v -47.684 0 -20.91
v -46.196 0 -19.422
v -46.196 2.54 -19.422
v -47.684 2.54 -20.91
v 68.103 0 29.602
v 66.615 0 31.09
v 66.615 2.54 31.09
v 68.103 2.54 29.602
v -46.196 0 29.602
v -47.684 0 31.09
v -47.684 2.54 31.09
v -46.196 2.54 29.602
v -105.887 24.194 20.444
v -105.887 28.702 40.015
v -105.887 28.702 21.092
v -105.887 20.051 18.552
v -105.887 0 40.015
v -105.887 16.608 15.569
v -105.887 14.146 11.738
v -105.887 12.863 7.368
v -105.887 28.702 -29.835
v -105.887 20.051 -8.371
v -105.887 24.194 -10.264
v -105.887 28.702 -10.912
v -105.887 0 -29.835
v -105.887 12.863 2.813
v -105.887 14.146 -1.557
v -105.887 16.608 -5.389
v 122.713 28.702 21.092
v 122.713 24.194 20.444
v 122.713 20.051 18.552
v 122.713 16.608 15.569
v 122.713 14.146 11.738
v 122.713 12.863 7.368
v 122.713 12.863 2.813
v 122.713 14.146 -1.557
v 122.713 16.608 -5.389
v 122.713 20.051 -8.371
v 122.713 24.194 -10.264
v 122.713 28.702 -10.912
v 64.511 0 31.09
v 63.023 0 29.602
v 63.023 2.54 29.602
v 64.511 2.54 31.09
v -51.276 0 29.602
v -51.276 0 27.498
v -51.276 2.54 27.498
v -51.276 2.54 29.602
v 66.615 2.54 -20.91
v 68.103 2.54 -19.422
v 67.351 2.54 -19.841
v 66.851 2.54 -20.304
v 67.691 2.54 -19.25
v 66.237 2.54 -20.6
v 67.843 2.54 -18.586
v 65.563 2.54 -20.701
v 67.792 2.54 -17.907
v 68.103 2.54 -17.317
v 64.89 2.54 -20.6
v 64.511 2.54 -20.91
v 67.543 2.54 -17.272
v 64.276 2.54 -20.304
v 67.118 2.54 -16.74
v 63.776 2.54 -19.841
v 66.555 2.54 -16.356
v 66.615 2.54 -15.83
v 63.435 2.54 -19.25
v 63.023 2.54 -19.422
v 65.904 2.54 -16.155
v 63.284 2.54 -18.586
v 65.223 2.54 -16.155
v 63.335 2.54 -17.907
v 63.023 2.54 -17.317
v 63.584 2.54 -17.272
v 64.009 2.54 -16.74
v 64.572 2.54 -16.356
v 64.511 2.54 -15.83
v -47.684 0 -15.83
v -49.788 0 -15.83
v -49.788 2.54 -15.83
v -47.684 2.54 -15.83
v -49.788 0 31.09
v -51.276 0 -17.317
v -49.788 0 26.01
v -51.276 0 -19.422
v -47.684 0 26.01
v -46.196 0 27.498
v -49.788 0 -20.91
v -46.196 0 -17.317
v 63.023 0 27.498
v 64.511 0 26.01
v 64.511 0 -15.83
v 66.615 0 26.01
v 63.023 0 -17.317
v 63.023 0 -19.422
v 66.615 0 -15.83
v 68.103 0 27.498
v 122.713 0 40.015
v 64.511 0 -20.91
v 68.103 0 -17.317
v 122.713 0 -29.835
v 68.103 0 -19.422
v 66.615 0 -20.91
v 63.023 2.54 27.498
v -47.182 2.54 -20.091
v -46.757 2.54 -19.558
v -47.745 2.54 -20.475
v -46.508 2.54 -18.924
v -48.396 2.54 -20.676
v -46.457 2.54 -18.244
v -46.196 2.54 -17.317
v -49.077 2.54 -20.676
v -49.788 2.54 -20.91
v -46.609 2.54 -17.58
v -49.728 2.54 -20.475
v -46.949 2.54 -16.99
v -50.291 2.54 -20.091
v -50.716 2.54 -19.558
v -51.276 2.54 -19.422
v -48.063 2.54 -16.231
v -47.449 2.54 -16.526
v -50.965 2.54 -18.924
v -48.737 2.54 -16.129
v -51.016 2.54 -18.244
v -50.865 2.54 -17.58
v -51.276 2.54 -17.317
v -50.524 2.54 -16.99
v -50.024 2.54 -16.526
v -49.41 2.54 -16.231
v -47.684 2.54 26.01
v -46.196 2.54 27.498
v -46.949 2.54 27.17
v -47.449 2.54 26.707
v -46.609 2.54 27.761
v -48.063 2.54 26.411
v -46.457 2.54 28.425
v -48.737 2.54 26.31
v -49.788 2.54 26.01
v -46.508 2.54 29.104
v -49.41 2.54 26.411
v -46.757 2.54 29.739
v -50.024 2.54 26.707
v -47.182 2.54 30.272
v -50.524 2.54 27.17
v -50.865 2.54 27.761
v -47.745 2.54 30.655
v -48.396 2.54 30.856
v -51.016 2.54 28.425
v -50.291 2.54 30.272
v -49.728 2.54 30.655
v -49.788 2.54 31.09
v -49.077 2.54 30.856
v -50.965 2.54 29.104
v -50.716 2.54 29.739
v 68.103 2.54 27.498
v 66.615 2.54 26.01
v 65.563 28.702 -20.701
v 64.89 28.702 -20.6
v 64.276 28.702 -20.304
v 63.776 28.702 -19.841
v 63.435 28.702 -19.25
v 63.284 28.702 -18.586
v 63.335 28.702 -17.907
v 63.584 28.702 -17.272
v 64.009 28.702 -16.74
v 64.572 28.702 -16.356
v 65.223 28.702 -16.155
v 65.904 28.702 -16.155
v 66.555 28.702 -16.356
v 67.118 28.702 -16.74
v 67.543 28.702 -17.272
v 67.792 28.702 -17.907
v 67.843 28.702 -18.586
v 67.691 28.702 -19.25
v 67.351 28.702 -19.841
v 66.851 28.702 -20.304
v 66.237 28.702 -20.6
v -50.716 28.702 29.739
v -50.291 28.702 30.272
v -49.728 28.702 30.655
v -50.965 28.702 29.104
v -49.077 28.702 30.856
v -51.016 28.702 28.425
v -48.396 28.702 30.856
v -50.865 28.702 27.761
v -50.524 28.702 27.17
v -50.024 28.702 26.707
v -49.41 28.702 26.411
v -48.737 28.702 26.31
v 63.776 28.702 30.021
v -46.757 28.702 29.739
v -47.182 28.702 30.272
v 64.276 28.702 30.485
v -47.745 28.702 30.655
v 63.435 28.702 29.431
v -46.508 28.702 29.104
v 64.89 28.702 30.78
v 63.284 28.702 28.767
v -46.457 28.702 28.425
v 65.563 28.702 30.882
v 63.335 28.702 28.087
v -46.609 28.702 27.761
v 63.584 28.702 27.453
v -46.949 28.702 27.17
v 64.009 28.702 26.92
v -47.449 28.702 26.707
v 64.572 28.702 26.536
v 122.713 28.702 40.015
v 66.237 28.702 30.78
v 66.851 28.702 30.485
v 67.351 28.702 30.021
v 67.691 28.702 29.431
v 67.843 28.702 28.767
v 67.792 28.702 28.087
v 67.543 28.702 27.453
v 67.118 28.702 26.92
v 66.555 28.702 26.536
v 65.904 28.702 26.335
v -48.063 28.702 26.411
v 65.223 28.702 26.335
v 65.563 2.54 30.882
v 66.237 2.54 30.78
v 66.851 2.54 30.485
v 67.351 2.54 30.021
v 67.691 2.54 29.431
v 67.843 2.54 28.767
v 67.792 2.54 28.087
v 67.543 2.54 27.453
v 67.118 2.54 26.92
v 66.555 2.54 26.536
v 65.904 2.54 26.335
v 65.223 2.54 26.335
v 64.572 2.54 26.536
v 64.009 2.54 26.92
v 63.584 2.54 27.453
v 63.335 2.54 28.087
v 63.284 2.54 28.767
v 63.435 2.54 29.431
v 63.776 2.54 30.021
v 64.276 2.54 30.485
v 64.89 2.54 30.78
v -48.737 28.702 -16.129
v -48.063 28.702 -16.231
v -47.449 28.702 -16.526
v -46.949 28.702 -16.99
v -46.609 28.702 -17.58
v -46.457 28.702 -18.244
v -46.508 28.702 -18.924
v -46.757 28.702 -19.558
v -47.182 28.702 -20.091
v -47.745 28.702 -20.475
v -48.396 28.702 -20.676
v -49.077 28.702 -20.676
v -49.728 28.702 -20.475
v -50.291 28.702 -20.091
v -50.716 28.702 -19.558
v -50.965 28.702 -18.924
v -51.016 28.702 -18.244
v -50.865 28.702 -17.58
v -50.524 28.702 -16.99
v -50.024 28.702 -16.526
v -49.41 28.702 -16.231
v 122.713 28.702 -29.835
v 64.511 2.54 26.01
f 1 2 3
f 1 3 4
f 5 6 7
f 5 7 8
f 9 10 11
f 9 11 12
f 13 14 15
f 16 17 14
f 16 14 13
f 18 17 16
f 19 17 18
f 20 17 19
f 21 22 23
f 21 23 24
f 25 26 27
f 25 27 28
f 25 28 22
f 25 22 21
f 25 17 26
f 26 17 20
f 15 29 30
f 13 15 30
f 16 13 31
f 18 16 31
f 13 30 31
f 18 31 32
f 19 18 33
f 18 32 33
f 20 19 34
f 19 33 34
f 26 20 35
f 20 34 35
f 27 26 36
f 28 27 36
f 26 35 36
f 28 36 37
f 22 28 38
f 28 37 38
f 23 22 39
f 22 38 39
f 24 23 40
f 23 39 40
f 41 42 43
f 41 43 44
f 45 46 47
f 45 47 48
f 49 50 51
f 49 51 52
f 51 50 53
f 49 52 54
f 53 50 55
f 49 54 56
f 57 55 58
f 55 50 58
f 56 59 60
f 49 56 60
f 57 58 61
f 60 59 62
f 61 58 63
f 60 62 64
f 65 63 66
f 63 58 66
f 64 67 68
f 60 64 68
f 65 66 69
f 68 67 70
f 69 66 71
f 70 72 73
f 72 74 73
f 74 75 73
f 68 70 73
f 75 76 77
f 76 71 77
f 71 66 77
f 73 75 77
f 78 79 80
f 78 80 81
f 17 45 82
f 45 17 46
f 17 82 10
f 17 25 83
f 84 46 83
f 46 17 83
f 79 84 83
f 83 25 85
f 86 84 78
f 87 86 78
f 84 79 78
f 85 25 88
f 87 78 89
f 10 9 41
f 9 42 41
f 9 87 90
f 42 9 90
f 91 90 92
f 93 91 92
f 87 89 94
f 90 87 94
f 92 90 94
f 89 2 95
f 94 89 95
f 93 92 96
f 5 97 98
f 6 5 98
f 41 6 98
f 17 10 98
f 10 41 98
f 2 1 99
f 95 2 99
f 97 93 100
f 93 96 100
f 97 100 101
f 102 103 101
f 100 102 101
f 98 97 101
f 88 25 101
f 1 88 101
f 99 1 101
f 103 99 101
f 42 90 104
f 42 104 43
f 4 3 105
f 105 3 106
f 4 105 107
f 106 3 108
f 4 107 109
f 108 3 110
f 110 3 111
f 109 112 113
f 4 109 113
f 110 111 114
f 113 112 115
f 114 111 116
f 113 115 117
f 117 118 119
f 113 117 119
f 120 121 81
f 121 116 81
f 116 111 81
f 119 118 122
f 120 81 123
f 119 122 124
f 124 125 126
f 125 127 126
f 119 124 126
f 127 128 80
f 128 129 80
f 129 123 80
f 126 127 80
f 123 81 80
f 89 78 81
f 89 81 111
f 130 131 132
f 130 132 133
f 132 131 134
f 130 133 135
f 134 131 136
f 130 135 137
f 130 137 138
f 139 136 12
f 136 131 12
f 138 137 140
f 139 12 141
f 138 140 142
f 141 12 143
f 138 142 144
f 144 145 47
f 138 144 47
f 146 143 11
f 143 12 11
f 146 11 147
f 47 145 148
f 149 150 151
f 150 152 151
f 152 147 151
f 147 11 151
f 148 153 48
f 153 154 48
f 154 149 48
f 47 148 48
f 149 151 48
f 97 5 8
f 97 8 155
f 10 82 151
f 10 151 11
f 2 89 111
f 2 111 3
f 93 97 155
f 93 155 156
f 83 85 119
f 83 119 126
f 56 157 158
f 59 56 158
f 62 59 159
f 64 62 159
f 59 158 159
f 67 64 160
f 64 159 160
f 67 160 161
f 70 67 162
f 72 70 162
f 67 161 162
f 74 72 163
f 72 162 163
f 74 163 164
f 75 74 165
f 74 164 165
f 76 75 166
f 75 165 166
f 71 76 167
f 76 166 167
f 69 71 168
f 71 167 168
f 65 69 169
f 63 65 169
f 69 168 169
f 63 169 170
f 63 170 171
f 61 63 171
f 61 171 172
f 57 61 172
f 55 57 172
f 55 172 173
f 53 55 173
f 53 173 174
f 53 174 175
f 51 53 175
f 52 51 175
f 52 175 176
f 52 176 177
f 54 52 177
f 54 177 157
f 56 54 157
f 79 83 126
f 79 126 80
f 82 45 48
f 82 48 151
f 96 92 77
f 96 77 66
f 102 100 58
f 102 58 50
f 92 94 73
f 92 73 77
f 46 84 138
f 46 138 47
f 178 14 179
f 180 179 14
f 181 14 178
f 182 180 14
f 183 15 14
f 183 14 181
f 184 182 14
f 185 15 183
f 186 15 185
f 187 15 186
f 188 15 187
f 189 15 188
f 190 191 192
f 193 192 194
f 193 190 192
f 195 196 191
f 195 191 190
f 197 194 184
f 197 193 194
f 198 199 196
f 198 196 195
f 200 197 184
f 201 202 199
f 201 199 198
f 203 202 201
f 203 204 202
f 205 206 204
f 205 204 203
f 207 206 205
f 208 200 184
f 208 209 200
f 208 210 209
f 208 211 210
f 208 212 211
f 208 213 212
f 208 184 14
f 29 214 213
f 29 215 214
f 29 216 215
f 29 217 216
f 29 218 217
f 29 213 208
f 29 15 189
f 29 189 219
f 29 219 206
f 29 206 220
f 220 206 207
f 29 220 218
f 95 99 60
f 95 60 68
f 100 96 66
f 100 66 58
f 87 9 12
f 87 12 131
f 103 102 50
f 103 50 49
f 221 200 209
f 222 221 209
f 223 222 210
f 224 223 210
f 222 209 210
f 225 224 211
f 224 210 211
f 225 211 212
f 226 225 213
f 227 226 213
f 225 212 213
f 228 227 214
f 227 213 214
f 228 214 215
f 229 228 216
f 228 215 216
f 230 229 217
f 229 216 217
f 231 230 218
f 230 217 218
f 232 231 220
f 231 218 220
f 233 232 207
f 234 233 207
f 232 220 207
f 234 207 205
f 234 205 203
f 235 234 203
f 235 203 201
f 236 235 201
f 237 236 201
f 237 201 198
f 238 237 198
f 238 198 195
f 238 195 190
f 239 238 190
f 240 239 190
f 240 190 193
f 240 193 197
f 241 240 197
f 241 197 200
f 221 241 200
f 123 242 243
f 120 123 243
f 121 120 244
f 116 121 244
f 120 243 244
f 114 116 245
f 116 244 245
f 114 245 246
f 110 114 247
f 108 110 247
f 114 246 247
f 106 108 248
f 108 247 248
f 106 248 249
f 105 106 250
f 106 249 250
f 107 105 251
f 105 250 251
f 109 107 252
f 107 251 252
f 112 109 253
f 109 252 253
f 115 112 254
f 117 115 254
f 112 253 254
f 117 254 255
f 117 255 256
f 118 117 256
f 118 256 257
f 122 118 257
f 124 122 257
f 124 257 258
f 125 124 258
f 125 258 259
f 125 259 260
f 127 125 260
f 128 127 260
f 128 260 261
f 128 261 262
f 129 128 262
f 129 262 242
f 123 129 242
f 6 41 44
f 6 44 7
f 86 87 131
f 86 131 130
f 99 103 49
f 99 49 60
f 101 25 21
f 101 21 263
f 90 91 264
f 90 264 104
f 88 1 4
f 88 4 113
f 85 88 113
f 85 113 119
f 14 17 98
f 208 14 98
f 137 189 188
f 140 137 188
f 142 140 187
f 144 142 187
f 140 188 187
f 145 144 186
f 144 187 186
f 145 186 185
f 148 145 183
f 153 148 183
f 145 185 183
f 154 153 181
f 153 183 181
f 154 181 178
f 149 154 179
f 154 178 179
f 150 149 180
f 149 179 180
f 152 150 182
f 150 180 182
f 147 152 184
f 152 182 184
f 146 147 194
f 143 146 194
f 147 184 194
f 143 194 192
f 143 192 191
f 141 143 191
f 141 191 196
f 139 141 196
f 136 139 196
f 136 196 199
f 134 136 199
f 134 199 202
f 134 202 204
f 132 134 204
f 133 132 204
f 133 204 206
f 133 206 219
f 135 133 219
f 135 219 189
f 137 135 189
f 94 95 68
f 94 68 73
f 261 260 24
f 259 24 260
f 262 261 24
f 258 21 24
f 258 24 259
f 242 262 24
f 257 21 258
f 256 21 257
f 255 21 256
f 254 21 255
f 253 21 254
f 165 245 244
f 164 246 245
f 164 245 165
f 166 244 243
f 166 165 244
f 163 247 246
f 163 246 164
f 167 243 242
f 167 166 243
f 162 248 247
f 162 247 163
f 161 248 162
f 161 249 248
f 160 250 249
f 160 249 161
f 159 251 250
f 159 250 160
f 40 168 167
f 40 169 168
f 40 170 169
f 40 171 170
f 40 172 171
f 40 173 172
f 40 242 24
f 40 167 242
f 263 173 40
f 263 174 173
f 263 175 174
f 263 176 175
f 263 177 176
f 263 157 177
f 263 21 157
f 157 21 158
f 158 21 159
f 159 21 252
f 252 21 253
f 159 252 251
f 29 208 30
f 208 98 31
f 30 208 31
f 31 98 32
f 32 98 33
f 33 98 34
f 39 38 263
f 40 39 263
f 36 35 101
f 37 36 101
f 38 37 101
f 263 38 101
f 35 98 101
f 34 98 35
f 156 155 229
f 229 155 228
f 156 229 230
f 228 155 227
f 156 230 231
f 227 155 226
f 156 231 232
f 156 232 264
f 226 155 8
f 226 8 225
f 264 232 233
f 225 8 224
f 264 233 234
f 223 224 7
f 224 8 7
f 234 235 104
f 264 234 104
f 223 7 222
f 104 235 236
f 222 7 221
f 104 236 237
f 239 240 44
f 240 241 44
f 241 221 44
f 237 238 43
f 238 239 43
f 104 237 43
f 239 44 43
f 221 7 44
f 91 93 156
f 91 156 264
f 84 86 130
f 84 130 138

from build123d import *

# Parameters (mm, degrees)
SKETCH1_W           = 228.6
SKETCH1_H           = 69.85
BOSS_EXTRUDE1_DEPTH = 28.702
SKETCH2_R           = 16.002
CUT_EXTRUDE1_DEPTH  = 234.843934843
SKETCH3_R           = 2.286
CUT_EXTRUDE2_DEPTH  = 133.225641813
CUT_EXTRUDE3_DEPTH  = 2.54


with BuildPart() as part:
    # Sketch1 → Boss-Extrude1 (new body)
    with BuildSketch(Plane(origin=(0, 0, 0), x_dir=(1, 0, 0), z_dir=(0, 1, 0))):
        with Locations((8.413464991, -5.090260323)):
            Rectangle(SKETCH1_W, SKETCH1_H)
    extrude(amount=BOSS_EXTRUDE1_DEPTH)

    # Sketch2 → Cut-Extrude1 (cut, through all)
    with BuildSketch(Plane(origin=(122.713464991, 0, 0), x_dir=(0, 0, -1), z_dir=(1, 0, 0))):
        with Locations((-5.090260323, 28.702)):
            Circle(SKETCH2_R)
    extrude(amount=-CUT_EXTRUDE1_DEPTH, mode=Mode.SUBTRACT)

    # Sketch3 → Cut-Extrude2 (cut, through all)
    with BuildSketch(Plane(origin=(0, 28.702, 0), x_dir=(1, 0, 0), z_dir=(0, 1, 0))):
        with Locations(Location((-48.736535009, 18.415261035, 0), (0, 0, 270))):
            Circle(SKETCH3_R)
        with Locations(Location((-48.736535009, -28.595781682, 0), (0, 0, 90))):
            Circle(SKETCH3_R)
        with Locations(Location((65.563464991, 18.415261035, 0), (0, 0, 90))):
            Circle(SKETCH3_R)
        with Locations(Location((65.563464991, -28.595781682, 0), (0, 0, 270))):
            Circle(SKETCH3_R)
    extrude(amount=-CUT_EXTRUDE2_DEPTH, mode=Mode.SUBTRACT)

    # Sketch4 → Cut-Extrude3 (cut)
    with BuildSketch(Plane.XZ):
        Polygon((-49.788475899, 31.090068722), (-47.684271002, 31.090068722), (-46.19637345, 29.602171171), (-46.19637345, 27.497966274), (-47.684271002, 26.010068722), (-49.788475899, 26.010068722), (-51.27637345, 27.497966274), (-51.27637345, 29.602171171), align=None)
        Polygon((-46.19637345, -19.421650524), (-47.684271002, -20.909548076), (-49.788475899, -20.909548076), (-51.27637345, -19.421650524), (-51.27637345, -17.317445628), (-49.788475899, -15.829548076), (-47.684271002, -15.829548076), (-46.19637345, -17.317445628), align=None)
        Polygon((66.615405881, -20.909548076), (64.511200984, -20.909548076), (63.023303432, -19.421650524), (63.023303432, -17.317445628), (64.511200984, -15.829548076), (66.615405881, -15.829548076), (68.103303432, -17.317445628), (68.103303432, -19.421650524), align=None)
        Polygon((63.023303432, 29.602171171), (64.511200984, 31.090068722), (66.615405881, 31.090068722), (68.103303432, 29.602171171), (68.103303432, 27.497966274), (66.615405881, 26.010068722), (64.511200984, 26.010068722), (63.023303432, 27.497966274), align=None)
    extrude(amount=-CUT_EXTRUDE3_DEPTH, mode=Mode.SUBTRACT)


solid = part.part
